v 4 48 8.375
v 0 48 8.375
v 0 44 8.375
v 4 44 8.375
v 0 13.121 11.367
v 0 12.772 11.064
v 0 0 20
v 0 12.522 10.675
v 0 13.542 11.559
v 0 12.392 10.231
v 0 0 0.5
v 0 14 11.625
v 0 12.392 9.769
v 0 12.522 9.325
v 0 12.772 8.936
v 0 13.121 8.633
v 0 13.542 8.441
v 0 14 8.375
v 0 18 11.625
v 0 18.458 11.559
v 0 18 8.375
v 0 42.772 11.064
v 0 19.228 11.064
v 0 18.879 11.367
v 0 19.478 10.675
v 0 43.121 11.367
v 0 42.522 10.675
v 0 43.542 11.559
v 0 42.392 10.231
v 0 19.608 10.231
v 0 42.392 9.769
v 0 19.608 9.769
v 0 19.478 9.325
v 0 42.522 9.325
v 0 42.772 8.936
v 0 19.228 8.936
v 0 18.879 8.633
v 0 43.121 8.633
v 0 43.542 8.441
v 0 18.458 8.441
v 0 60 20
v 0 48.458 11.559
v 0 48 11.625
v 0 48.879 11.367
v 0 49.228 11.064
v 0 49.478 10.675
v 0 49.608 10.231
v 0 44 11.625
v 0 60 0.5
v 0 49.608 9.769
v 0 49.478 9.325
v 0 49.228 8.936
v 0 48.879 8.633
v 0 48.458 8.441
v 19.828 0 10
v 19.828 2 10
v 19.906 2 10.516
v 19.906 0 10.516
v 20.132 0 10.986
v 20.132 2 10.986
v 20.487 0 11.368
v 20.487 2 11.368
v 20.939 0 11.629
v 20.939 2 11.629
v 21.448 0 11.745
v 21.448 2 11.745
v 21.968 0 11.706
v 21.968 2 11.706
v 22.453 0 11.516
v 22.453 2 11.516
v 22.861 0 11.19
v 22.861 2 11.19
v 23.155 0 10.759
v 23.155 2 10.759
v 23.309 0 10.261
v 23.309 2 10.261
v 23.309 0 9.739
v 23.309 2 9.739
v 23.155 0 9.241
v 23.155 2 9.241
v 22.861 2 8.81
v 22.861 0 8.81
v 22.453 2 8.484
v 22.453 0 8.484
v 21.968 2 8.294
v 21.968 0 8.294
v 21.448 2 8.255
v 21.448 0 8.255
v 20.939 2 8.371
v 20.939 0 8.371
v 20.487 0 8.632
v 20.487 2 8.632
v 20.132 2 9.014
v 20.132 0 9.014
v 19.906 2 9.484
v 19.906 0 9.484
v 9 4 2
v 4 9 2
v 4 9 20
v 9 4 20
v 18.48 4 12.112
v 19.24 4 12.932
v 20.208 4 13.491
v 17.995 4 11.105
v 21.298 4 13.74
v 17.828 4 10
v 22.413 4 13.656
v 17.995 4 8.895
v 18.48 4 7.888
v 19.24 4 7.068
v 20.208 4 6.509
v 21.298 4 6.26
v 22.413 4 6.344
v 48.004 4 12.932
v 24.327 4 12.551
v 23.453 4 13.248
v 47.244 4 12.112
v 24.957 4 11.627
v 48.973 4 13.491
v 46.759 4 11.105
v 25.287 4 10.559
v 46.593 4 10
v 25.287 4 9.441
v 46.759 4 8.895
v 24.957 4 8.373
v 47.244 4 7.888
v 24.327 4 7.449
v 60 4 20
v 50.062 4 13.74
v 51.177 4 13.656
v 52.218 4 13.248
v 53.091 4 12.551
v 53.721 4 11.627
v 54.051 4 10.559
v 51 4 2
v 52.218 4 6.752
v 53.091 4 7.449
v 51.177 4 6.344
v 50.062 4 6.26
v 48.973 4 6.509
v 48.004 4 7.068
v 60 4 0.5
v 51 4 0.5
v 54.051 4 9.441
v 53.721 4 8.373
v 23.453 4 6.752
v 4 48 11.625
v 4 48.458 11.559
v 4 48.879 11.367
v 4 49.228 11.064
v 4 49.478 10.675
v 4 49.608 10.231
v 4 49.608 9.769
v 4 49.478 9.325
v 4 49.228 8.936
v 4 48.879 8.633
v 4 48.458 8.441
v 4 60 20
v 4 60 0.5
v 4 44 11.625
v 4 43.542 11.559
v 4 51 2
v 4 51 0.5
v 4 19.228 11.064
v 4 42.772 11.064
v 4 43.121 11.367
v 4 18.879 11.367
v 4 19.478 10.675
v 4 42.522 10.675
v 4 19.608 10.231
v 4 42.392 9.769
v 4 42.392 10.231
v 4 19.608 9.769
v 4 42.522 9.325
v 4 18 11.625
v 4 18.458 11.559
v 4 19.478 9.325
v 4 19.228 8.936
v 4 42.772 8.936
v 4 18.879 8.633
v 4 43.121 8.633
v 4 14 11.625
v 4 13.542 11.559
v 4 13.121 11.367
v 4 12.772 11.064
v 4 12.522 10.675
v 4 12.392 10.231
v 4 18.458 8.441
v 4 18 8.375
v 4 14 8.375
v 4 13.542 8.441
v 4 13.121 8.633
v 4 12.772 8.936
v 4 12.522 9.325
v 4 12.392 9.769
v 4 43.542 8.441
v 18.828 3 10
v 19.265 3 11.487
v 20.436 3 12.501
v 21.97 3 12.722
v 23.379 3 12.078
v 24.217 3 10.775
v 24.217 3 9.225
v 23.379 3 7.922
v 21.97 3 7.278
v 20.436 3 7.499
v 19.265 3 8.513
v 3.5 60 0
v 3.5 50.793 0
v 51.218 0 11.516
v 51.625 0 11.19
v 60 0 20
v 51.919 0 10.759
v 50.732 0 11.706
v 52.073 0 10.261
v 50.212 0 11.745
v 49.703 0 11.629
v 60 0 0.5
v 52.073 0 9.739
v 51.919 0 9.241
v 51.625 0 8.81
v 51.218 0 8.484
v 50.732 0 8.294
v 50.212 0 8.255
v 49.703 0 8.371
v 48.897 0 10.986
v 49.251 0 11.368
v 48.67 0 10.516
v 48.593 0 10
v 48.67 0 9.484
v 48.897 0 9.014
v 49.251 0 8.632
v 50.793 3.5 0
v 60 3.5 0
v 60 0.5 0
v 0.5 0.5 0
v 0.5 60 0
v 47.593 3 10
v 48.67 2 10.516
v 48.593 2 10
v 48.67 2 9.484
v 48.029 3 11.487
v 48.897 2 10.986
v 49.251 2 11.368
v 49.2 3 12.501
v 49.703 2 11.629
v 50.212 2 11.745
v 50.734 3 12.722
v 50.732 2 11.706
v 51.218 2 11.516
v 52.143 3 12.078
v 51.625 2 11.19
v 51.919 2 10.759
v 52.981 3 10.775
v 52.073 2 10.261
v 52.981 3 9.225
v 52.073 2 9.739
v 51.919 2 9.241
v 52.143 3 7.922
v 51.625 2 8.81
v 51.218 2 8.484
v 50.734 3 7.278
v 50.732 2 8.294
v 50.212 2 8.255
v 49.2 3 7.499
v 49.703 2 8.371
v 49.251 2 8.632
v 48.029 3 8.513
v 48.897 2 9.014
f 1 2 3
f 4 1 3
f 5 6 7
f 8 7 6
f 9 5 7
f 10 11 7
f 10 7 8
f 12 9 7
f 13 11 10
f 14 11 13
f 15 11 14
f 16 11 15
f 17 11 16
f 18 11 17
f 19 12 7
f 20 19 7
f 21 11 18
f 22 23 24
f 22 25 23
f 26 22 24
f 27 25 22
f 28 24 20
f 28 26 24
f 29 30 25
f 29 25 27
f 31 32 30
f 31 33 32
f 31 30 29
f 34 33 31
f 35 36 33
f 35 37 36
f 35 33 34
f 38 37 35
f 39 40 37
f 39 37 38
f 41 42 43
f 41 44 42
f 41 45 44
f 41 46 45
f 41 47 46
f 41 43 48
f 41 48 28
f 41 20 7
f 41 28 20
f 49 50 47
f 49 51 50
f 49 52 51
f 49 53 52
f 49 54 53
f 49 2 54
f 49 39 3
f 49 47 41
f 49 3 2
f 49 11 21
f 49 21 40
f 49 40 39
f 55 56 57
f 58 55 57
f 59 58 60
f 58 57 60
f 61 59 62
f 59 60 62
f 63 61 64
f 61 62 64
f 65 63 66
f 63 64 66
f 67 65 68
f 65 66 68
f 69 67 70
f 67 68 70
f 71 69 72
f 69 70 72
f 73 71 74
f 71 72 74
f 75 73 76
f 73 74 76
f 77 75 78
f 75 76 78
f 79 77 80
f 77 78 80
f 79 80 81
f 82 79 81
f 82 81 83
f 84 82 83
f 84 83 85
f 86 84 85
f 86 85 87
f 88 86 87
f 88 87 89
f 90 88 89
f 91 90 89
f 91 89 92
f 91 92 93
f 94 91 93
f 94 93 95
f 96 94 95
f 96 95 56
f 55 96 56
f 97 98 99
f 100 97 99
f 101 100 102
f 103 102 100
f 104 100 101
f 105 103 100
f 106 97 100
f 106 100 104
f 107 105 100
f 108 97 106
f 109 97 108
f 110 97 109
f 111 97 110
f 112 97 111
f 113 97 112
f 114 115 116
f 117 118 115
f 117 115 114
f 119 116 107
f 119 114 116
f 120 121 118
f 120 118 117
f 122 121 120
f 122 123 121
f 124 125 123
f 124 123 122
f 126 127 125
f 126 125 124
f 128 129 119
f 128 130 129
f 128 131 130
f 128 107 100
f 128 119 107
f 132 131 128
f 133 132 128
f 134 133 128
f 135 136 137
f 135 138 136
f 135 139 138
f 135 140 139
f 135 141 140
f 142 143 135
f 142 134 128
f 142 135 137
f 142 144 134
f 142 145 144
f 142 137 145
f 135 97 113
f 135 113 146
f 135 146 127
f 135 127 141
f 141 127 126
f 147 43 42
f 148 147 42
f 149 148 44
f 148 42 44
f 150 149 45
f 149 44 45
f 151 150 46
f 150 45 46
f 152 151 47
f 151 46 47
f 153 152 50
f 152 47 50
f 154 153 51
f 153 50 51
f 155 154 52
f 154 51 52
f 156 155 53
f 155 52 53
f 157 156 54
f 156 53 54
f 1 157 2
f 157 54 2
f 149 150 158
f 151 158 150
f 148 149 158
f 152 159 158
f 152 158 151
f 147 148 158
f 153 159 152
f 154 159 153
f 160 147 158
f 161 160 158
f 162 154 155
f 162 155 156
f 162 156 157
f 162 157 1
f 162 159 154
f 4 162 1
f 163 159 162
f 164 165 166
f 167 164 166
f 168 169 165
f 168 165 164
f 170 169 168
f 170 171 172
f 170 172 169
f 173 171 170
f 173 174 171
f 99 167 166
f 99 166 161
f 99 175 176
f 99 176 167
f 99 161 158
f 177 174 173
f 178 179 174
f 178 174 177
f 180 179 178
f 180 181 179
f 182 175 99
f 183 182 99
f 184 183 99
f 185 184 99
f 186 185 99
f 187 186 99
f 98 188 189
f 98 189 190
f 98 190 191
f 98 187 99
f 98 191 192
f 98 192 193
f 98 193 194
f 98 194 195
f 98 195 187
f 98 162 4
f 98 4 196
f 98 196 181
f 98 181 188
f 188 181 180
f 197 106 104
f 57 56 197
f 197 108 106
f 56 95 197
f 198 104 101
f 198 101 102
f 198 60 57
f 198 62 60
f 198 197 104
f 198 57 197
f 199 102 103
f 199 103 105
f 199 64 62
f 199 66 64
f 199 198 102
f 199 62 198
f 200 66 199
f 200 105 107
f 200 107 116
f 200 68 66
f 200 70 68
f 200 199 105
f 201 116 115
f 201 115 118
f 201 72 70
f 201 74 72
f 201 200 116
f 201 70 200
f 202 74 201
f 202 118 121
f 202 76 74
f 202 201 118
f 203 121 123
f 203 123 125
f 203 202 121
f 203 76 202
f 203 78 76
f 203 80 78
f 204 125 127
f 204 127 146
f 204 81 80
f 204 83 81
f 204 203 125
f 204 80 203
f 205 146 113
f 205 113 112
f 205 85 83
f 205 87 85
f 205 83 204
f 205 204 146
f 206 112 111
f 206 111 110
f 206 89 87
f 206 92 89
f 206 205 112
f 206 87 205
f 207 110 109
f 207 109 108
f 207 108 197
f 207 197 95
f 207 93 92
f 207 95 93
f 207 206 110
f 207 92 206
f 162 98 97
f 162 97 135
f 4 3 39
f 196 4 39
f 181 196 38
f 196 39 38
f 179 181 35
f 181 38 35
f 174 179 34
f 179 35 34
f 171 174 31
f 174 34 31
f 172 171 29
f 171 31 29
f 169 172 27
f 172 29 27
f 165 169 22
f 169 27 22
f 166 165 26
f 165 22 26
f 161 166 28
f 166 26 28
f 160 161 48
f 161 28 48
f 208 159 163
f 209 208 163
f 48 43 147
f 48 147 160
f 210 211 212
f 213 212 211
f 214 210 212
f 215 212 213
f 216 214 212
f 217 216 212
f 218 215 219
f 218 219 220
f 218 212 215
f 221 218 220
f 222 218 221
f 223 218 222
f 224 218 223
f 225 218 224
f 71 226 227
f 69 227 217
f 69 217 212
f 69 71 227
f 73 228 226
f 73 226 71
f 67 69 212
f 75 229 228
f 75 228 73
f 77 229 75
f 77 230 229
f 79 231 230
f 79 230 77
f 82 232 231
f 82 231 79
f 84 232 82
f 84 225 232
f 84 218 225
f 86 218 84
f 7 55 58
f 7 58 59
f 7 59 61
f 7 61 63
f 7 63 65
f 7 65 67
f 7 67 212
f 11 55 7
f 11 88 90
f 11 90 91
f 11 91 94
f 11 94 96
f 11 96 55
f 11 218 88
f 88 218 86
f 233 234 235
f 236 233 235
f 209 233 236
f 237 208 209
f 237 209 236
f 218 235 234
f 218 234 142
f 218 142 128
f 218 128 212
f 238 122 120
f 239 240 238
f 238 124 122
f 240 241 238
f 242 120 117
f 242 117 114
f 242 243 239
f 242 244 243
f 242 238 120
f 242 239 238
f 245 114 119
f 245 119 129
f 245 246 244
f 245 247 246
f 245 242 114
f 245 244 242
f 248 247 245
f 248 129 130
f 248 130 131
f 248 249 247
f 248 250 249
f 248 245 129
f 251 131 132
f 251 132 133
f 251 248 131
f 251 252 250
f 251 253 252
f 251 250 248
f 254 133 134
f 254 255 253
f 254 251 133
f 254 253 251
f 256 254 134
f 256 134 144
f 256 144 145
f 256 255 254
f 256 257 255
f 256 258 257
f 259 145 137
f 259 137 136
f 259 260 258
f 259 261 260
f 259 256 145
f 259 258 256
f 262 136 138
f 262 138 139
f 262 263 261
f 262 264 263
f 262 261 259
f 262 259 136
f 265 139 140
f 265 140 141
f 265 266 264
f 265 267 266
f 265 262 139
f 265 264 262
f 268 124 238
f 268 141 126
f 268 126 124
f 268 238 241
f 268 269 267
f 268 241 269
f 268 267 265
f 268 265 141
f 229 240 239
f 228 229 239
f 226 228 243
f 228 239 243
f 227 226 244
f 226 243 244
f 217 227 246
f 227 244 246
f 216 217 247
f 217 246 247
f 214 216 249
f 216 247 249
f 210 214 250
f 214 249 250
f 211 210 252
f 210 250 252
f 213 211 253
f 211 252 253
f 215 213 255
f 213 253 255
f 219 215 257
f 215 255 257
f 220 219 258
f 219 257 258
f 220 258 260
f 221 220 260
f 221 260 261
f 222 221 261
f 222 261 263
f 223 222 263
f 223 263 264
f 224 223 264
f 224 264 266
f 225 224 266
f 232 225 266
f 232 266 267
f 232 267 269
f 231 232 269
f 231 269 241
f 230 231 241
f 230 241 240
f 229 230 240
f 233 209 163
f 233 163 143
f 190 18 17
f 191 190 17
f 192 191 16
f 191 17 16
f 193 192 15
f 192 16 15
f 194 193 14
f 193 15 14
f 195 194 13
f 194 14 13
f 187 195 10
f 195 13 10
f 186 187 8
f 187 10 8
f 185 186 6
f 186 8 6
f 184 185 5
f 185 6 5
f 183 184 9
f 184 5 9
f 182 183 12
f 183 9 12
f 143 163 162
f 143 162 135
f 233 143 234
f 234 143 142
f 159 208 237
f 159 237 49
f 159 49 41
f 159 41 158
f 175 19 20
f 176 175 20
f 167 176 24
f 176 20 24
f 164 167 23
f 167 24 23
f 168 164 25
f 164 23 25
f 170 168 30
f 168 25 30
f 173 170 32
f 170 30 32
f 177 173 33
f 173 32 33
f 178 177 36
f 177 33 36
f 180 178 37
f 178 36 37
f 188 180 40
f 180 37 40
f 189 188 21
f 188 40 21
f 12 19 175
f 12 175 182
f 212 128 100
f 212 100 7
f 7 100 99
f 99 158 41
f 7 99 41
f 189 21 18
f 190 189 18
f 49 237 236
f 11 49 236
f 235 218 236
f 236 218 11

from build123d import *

# Parameters (mm, degrees)
PAD_DEPTH       = 20
PAD001_DEPTH    = 2
CHAMFER_SIZE    = 0.5
CHAMFER001_SIZE = 0.5
CHAMFER002_SIZE = 0.5
CHAMFER003_SIZE = 5
SKETCH002_R     = 1.75
HOLE_DEPTH      = 25
CHAMFER004_SIZE = 2
POCKET_DEPTH    = 5
CHAMFER005_SIZE = 0.5


with BuildPart() as part:
    # Sketch → Pad (new body)
    with BuildSketch(Plane.XY):
        Polygon((0, 0), (0, 60), (4, 60), (4, 4), (60, 4), (60, 0), align=None)
    extrude(amount=PAD_DEPTH)

    # Sketch001 (on Face7 of Pad) → Pad001 (join)
    with BuildSketch(Plane(origin=(0, 0, 0), x_dir=(1, 0, 0), z_dir=(0, 0, -1))):
        Polygon((0, 0), (0, -55), (55, 0), align=None)
    extrude(amount=-PAD001_DEPTH)

    # Chamfer
    chamfer_edges = [part.edges().sort_by_distance(p)[0] for p in [
        (27.5, 0, 0),
        (57.5, 0, 0),
    ]]
    chamfer(chamfer_edges, length=CHAMFER_SIZE)

    # Chamfer001
    chamfer001_edges = [part.edges().sort_by_distance(p)[0] for p in [
        (0, 27.75, 0),
        (0, 57.5, 0),
    ]]
    chamfer(chamfer001_edges, length=CHAMFER001_SIZE)

    # Chamfer002
    chamfer002_edges = [part.edges().sort_by_distance(p)[0] for p in [
        (4, 55.5, 0),
        (55.5, 4, 0),
    ]]
    chamfer(chamfer002_edges, length=CHAMFER002_SIZE)

    # Chamfer003
    chamfer003_edges = [part.edges().sort_by_distance(p)[0] for p in [
        (4, 4, 11),
    ]]
    chamfer(chamfer003_edges, length=CHAMFER003_SIZE)

    # Sketch002 (on Face9 of Chamfer003) → Hole (cut)
    with BuildSketch(Plane(origin=(0, 4, 0), x_dir=(-1, 0, 0), z_dir=(0, 1, 0))):
        with Locations((-50.342533, 10)):
            Circle(SKETCH002_R)
        with Locations((-21.578398, 10)):
            Circle(SKETCH002_R)
    extrude(amount=-HOLE_DEPTH, mode=Mode.SUBTRACT)

    # Chamfer004
    chamfer004_edges = [part.edges().sort_by_distance(p)[0] for p in [
        (19.828398, 4, 10),
        (48.592533, 4, 10),
    ]]
    chamfer(chamfer004_edges, length=CHAMFER004_SIZE)

    # Sketch003 (on Face14 of Chamfer004) → Pocket (cut)
    with BuildSketch(Plane(origin=(0, 0, 0), x_dir=(0, -1, 0), z_dir=(-1, 0, 0))):
        with BuildLine():
            ThreePointArc((-48, 11.625), (-49.625, 10), (-48, 8.375))
            Line((-48, 8.375), (-44, 8.375))
            ThreePointArc((-44, 8.375), (-42.375, 10), (-44, 11.625))
            Line((-48, 11.625), (-44, 11.625))
        make_face()
        with BuildLine():
            ThreePointArc((-18, 11.625), (-19.625, 10), (-18, 8.375))
            Line((-18, 8.375), (-14, 8.375))
            ThreePointArc((-14, 8.375), (-12.375, 10), (-14, 11.625))
            Line((-18, 11.625), (-14, 11.625))
        make_face()
    extrude(amount=-POCKET_DEPTH, mode=Mode.SUBTRACT)

    # Chamfer005
    chamfer005_edges = [part.edges().sort_by_distance(p)[0] for p in [
        (27.5, 27.5, 0),
    ]]
    chamfer(chamfer005_edges, length=CHAMFER005_SIZE)


solid = part.part
